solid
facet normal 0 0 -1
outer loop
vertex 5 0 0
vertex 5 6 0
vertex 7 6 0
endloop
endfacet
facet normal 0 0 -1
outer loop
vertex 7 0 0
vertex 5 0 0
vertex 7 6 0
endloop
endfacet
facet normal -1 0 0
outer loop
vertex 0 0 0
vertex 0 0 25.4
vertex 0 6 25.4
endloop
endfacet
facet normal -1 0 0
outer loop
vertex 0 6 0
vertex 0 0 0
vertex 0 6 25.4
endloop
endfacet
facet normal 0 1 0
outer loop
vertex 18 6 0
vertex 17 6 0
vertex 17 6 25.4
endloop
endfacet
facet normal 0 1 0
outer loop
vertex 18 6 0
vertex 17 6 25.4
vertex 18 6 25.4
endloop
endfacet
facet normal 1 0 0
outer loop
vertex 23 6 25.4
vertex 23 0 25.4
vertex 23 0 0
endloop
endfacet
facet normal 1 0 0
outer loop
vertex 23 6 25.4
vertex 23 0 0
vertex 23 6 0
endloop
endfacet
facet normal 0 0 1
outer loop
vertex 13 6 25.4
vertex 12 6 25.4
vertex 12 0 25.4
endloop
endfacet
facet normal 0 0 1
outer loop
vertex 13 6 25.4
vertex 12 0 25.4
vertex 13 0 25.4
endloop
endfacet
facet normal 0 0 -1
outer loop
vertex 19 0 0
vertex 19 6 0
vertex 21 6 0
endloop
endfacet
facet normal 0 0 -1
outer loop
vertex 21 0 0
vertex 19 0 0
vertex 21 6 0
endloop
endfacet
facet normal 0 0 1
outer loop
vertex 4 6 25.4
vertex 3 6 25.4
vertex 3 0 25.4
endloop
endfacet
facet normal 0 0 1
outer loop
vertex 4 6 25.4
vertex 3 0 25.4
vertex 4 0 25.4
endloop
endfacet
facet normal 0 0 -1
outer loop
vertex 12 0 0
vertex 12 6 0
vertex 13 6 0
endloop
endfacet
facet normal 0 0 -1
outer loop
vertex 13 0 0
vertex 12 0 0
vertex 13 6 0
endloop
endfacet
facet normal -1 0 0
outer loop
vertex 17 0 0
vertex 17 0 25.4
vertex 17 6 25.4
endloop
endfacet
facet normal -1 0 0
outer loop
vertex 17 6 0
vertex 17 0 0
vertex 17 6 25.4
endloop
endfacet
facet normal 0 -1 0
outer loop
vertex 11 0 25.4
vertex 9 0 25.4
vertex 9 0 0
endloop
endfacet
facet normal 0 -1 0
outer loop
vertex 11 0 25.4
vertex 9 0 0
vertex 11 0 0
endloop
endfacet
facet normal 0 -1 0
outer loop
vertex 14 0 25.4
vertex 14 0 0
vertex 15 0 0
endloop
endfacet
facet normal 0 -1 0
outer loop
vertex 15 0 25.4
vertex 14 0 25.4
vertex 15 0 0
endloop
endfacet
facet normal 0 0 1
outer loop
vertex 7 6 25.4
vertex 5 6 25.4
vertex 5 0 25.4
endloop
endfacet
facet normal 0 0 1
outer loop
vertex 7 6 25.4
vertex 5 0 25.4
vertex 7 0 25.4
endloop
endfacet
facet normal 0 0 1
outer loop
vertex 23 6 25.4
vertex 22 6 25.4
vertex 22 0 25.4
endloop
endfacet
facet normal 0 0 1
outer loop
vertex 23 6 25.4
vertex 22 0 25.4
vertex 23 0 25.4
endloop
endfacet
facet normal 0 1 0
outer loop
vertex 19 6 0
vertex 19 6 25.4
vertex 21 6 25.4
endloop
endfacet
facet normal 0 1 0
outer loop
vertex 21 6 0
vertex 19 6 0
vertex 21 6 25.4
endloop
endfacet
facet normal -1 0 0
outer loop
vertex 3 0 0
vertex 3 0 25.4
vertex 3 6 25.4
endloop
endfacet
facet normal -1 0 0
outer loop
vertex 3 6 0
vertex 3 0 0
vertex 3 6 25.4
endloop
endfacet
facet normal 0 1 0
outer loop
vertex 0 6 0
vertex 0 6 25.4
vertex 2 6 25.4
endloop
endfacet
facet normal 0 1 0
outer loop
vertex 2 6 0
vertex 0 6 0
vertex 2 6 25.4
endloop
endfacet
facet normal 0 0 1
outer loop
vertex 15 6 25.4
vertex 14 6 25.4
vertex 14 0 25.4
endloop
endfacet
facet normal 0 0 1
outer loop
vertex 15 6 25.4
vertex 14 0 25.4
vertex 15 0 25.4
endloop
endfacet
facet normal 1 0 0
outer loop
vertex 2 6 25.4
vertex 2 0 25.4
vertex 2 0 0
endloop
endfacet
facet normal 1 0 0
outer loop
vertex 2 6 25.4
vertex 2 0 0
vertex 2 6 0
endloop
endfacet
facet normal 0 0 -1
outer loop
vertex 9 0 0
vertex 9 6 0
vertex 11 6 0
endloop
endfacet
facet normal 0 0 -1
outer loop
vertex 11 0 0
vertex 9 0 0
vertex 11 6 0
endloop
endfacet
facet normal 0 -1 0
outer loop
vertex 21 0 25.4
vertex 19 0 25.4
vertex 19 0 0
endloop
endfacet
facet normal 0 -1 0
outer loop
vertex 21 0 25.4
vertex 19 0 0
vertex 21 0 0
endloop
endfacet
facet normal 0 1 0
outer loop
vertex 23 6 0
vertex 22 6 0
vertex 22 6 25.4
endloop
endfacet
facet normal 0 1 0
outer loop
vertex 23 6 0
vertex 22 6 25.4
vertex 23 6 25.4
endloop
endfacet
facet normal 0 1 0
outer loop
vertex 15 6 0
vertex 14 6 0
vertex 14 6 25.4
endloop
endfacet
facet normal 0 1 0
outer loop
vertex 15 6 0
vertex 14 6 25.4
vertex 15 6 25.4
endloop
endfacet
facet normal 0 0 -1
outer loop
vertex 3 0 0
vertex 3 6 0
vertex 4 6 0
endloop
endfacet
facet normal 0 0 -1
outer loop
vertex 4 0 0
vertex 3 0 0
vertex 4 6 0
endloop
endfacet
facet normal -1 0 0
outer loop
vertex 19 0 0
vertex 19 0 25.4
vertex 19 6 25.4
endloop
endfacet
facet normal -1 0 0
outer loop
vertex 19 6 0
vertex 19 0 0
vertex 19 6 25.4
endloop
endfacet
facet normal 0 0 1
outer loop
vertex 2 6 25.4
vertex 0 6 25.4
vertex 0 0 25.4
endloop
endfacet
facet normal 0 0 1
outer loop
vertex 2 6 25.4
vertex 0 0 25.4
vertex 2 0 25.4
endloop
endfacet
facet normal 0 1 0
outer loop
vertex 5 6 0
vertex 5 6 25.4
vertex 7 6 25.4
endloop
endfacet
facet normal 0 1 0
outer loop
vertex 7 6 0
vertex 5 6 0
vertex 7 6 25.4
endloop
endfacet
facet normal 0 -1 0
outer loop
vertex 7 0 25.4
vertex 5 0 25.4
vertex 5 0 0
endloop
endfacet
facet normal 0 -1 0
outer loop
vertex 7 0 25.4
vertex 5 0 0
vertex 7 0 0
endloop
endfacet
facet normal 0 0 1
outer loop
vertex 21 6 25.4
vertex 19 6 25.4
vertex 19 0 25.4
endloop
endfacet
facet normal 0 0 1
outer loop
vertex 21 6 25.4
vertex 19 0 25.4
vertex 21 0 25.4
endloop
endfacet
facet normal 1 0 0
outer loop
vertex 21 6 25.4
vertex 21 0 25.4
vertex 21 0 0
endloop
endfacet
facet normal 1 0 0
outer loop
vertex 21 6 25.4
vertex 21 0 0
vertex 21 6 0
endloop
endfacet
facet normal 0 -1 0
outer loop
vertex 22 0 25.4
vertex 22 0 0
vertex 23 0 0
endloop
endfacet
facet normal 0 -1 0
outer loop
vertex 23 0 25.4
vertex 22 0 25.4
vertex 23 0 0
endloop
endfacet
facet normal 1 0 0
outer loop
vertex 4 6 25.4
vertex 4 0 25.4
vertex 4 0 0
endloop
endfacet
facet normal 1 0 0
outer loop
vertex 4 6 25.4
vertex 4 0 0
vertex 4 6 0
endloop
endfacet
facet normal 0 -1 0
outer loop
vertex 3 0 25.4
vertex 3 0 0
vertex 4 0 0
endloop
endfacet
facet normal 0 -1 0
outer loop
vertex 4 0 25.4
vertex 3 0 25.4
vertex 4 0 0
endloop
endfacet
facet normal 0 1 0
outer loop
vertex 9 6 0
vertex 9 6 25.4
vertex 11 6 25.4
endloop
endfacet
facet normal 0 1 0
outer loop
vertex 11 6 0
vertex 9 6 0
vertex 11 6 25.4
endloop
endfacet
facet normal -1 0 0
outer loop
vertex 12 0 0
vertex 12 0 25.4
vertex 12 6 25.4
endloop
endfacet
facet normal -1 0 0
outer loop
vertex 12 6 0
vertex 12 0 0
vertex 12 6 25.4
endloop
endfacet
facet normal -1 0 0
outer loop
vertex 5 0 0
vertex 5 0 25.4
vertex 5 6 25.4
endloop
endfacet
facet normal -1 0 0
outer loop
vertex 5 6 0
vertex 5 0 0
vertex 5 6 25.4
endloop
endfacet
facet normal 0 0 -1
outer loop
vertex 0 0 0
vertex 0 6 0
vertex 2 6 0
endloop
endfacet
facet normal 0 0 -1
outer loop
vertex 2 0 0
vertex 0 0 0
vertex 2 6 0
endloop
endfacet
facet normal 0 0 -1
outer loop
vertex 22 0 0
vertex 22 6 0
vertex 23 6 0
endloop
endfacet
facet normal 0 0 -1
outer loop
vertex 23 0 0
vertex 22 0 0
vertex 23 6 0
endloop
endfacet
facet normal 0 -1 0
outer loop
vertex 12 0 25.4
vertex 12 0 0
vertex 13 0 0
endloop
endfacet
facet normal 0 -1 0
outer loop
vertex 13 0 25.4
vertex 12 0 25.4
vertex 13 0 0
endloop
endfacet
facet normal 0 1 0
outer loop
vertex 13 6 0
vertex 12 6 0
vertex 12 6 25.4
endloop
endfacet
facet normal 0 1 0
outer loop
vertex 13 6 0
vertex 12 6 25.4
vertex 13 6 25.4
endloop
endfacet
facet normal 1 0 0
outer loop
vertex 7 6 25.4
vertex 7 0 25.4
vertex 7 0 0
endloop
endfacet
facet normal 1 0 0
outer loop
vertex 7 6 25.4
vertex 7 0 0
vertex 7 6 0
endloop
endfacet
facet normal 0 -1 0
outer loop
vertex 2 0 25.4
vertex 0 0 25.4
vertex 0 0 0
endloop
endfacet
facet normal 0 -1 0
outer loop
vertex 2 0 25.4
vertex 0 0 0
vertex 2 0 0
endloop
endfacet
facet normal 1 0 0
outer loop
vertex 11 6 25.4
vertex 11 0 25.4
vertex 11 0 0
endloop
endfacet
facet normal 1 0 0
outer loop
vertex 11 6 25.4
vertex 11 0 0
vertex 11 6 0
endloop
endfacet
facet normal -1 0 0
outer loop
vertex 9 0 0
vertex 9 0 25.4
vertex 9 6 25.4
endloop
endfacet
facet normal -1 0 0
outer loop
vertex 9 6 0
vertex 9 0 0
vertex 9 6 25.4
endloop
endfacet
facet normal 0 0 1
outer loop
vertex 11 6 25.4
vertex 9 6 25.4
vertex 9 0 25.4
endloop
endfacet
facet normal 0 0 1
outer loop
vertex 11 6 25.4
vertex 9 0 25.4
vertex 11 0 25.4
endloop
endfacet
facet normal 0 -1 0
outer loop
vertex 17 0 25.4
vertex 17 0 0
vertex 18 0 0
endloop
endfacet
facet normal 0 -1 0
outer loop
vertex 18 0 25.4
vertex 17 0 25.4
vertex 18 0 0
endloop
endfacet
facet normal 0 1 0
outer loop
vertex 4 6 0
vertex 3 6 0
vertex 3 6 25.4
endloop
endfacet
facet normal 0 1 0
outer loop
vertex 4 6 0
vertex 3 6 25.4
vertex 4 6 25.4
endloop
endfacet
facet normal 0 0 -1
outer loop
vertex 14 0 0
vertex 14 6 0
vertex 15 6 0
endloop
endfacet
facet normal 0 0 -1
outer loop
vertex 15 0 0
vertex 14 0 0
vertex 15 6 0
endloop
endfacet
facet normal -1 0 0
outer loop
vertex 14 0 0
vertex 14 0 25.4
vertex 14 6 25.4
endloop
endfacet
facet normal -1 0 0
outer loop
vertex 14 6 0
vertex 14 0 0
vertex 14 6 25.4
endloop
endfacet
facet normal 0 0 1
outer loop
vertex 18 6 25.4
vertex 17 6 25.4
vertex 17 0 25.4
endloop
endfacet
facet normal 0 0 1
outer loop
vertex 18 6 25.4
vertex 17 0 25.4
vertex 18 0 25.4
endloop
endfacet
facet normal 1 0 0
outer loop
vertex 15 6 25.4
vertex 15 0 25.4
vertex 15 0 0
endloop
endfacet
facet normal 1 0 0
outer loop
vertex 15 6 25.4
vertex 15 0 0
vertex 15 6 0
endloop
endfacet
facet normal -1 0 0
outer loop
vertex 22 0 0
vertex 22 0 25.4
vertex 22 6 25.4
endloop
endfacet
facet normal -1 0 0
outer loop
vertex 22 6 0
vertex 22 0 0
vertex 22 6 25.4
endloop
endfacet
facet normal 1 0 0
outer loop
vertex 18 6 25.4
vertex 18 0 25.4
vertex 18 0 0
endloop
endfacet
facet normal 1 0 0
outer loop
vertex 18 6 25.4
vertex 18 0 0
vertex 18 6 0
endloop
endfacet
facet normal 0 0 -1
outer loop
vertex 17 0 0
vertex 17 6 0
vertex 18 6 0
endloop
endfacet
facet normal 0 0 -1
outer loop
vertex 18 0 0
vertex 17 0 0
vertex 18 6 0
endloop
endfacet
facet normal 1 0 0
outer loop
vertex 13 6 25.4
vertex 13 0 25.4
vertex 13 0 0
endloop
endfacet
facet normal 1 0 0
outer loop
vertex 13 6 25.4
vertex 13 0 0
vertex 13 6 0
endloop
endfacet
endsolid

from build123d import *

# Parameters (mm, degrees)
F0_W     = 2
F0_H     = 6
F0_W_2   = 1
F1_DEPTH = 25.4


with BuildPart() as f1:
    # F0 (on Top) → F1 (new body)
    with BuildSketch(Plane.XY):
        with Locations((1, 3)):
            Rectangle(F0_W, F0_H)
        with Locations((3.5, 3)):
            Rectangle(F0_W_2, F0_H)
        with Locations((6, 3)):
            Rectangle(F0_W, F0_H)
        with Locations((10, 3)):
            Rectangle(F0_W, F0_H)
        with Locations((12.5, 3)):
            Rectangle(F0_W_2, F0_H)
        with Locations((14.5, 3)):
            Rectangle(F0_W_2, F0_H)
        with Locations((17.5, 3)):
            Rectangle(F0_W_2, F0_H)
        with Locations((20, 3)):
            Rectangle(F0_W, F0_H)
        with Locations((22.5, 3)):
            Rectangle(F0_W_2, F0_H)
    extrude(amount=F1_DEPTH)


solid = f1.part
